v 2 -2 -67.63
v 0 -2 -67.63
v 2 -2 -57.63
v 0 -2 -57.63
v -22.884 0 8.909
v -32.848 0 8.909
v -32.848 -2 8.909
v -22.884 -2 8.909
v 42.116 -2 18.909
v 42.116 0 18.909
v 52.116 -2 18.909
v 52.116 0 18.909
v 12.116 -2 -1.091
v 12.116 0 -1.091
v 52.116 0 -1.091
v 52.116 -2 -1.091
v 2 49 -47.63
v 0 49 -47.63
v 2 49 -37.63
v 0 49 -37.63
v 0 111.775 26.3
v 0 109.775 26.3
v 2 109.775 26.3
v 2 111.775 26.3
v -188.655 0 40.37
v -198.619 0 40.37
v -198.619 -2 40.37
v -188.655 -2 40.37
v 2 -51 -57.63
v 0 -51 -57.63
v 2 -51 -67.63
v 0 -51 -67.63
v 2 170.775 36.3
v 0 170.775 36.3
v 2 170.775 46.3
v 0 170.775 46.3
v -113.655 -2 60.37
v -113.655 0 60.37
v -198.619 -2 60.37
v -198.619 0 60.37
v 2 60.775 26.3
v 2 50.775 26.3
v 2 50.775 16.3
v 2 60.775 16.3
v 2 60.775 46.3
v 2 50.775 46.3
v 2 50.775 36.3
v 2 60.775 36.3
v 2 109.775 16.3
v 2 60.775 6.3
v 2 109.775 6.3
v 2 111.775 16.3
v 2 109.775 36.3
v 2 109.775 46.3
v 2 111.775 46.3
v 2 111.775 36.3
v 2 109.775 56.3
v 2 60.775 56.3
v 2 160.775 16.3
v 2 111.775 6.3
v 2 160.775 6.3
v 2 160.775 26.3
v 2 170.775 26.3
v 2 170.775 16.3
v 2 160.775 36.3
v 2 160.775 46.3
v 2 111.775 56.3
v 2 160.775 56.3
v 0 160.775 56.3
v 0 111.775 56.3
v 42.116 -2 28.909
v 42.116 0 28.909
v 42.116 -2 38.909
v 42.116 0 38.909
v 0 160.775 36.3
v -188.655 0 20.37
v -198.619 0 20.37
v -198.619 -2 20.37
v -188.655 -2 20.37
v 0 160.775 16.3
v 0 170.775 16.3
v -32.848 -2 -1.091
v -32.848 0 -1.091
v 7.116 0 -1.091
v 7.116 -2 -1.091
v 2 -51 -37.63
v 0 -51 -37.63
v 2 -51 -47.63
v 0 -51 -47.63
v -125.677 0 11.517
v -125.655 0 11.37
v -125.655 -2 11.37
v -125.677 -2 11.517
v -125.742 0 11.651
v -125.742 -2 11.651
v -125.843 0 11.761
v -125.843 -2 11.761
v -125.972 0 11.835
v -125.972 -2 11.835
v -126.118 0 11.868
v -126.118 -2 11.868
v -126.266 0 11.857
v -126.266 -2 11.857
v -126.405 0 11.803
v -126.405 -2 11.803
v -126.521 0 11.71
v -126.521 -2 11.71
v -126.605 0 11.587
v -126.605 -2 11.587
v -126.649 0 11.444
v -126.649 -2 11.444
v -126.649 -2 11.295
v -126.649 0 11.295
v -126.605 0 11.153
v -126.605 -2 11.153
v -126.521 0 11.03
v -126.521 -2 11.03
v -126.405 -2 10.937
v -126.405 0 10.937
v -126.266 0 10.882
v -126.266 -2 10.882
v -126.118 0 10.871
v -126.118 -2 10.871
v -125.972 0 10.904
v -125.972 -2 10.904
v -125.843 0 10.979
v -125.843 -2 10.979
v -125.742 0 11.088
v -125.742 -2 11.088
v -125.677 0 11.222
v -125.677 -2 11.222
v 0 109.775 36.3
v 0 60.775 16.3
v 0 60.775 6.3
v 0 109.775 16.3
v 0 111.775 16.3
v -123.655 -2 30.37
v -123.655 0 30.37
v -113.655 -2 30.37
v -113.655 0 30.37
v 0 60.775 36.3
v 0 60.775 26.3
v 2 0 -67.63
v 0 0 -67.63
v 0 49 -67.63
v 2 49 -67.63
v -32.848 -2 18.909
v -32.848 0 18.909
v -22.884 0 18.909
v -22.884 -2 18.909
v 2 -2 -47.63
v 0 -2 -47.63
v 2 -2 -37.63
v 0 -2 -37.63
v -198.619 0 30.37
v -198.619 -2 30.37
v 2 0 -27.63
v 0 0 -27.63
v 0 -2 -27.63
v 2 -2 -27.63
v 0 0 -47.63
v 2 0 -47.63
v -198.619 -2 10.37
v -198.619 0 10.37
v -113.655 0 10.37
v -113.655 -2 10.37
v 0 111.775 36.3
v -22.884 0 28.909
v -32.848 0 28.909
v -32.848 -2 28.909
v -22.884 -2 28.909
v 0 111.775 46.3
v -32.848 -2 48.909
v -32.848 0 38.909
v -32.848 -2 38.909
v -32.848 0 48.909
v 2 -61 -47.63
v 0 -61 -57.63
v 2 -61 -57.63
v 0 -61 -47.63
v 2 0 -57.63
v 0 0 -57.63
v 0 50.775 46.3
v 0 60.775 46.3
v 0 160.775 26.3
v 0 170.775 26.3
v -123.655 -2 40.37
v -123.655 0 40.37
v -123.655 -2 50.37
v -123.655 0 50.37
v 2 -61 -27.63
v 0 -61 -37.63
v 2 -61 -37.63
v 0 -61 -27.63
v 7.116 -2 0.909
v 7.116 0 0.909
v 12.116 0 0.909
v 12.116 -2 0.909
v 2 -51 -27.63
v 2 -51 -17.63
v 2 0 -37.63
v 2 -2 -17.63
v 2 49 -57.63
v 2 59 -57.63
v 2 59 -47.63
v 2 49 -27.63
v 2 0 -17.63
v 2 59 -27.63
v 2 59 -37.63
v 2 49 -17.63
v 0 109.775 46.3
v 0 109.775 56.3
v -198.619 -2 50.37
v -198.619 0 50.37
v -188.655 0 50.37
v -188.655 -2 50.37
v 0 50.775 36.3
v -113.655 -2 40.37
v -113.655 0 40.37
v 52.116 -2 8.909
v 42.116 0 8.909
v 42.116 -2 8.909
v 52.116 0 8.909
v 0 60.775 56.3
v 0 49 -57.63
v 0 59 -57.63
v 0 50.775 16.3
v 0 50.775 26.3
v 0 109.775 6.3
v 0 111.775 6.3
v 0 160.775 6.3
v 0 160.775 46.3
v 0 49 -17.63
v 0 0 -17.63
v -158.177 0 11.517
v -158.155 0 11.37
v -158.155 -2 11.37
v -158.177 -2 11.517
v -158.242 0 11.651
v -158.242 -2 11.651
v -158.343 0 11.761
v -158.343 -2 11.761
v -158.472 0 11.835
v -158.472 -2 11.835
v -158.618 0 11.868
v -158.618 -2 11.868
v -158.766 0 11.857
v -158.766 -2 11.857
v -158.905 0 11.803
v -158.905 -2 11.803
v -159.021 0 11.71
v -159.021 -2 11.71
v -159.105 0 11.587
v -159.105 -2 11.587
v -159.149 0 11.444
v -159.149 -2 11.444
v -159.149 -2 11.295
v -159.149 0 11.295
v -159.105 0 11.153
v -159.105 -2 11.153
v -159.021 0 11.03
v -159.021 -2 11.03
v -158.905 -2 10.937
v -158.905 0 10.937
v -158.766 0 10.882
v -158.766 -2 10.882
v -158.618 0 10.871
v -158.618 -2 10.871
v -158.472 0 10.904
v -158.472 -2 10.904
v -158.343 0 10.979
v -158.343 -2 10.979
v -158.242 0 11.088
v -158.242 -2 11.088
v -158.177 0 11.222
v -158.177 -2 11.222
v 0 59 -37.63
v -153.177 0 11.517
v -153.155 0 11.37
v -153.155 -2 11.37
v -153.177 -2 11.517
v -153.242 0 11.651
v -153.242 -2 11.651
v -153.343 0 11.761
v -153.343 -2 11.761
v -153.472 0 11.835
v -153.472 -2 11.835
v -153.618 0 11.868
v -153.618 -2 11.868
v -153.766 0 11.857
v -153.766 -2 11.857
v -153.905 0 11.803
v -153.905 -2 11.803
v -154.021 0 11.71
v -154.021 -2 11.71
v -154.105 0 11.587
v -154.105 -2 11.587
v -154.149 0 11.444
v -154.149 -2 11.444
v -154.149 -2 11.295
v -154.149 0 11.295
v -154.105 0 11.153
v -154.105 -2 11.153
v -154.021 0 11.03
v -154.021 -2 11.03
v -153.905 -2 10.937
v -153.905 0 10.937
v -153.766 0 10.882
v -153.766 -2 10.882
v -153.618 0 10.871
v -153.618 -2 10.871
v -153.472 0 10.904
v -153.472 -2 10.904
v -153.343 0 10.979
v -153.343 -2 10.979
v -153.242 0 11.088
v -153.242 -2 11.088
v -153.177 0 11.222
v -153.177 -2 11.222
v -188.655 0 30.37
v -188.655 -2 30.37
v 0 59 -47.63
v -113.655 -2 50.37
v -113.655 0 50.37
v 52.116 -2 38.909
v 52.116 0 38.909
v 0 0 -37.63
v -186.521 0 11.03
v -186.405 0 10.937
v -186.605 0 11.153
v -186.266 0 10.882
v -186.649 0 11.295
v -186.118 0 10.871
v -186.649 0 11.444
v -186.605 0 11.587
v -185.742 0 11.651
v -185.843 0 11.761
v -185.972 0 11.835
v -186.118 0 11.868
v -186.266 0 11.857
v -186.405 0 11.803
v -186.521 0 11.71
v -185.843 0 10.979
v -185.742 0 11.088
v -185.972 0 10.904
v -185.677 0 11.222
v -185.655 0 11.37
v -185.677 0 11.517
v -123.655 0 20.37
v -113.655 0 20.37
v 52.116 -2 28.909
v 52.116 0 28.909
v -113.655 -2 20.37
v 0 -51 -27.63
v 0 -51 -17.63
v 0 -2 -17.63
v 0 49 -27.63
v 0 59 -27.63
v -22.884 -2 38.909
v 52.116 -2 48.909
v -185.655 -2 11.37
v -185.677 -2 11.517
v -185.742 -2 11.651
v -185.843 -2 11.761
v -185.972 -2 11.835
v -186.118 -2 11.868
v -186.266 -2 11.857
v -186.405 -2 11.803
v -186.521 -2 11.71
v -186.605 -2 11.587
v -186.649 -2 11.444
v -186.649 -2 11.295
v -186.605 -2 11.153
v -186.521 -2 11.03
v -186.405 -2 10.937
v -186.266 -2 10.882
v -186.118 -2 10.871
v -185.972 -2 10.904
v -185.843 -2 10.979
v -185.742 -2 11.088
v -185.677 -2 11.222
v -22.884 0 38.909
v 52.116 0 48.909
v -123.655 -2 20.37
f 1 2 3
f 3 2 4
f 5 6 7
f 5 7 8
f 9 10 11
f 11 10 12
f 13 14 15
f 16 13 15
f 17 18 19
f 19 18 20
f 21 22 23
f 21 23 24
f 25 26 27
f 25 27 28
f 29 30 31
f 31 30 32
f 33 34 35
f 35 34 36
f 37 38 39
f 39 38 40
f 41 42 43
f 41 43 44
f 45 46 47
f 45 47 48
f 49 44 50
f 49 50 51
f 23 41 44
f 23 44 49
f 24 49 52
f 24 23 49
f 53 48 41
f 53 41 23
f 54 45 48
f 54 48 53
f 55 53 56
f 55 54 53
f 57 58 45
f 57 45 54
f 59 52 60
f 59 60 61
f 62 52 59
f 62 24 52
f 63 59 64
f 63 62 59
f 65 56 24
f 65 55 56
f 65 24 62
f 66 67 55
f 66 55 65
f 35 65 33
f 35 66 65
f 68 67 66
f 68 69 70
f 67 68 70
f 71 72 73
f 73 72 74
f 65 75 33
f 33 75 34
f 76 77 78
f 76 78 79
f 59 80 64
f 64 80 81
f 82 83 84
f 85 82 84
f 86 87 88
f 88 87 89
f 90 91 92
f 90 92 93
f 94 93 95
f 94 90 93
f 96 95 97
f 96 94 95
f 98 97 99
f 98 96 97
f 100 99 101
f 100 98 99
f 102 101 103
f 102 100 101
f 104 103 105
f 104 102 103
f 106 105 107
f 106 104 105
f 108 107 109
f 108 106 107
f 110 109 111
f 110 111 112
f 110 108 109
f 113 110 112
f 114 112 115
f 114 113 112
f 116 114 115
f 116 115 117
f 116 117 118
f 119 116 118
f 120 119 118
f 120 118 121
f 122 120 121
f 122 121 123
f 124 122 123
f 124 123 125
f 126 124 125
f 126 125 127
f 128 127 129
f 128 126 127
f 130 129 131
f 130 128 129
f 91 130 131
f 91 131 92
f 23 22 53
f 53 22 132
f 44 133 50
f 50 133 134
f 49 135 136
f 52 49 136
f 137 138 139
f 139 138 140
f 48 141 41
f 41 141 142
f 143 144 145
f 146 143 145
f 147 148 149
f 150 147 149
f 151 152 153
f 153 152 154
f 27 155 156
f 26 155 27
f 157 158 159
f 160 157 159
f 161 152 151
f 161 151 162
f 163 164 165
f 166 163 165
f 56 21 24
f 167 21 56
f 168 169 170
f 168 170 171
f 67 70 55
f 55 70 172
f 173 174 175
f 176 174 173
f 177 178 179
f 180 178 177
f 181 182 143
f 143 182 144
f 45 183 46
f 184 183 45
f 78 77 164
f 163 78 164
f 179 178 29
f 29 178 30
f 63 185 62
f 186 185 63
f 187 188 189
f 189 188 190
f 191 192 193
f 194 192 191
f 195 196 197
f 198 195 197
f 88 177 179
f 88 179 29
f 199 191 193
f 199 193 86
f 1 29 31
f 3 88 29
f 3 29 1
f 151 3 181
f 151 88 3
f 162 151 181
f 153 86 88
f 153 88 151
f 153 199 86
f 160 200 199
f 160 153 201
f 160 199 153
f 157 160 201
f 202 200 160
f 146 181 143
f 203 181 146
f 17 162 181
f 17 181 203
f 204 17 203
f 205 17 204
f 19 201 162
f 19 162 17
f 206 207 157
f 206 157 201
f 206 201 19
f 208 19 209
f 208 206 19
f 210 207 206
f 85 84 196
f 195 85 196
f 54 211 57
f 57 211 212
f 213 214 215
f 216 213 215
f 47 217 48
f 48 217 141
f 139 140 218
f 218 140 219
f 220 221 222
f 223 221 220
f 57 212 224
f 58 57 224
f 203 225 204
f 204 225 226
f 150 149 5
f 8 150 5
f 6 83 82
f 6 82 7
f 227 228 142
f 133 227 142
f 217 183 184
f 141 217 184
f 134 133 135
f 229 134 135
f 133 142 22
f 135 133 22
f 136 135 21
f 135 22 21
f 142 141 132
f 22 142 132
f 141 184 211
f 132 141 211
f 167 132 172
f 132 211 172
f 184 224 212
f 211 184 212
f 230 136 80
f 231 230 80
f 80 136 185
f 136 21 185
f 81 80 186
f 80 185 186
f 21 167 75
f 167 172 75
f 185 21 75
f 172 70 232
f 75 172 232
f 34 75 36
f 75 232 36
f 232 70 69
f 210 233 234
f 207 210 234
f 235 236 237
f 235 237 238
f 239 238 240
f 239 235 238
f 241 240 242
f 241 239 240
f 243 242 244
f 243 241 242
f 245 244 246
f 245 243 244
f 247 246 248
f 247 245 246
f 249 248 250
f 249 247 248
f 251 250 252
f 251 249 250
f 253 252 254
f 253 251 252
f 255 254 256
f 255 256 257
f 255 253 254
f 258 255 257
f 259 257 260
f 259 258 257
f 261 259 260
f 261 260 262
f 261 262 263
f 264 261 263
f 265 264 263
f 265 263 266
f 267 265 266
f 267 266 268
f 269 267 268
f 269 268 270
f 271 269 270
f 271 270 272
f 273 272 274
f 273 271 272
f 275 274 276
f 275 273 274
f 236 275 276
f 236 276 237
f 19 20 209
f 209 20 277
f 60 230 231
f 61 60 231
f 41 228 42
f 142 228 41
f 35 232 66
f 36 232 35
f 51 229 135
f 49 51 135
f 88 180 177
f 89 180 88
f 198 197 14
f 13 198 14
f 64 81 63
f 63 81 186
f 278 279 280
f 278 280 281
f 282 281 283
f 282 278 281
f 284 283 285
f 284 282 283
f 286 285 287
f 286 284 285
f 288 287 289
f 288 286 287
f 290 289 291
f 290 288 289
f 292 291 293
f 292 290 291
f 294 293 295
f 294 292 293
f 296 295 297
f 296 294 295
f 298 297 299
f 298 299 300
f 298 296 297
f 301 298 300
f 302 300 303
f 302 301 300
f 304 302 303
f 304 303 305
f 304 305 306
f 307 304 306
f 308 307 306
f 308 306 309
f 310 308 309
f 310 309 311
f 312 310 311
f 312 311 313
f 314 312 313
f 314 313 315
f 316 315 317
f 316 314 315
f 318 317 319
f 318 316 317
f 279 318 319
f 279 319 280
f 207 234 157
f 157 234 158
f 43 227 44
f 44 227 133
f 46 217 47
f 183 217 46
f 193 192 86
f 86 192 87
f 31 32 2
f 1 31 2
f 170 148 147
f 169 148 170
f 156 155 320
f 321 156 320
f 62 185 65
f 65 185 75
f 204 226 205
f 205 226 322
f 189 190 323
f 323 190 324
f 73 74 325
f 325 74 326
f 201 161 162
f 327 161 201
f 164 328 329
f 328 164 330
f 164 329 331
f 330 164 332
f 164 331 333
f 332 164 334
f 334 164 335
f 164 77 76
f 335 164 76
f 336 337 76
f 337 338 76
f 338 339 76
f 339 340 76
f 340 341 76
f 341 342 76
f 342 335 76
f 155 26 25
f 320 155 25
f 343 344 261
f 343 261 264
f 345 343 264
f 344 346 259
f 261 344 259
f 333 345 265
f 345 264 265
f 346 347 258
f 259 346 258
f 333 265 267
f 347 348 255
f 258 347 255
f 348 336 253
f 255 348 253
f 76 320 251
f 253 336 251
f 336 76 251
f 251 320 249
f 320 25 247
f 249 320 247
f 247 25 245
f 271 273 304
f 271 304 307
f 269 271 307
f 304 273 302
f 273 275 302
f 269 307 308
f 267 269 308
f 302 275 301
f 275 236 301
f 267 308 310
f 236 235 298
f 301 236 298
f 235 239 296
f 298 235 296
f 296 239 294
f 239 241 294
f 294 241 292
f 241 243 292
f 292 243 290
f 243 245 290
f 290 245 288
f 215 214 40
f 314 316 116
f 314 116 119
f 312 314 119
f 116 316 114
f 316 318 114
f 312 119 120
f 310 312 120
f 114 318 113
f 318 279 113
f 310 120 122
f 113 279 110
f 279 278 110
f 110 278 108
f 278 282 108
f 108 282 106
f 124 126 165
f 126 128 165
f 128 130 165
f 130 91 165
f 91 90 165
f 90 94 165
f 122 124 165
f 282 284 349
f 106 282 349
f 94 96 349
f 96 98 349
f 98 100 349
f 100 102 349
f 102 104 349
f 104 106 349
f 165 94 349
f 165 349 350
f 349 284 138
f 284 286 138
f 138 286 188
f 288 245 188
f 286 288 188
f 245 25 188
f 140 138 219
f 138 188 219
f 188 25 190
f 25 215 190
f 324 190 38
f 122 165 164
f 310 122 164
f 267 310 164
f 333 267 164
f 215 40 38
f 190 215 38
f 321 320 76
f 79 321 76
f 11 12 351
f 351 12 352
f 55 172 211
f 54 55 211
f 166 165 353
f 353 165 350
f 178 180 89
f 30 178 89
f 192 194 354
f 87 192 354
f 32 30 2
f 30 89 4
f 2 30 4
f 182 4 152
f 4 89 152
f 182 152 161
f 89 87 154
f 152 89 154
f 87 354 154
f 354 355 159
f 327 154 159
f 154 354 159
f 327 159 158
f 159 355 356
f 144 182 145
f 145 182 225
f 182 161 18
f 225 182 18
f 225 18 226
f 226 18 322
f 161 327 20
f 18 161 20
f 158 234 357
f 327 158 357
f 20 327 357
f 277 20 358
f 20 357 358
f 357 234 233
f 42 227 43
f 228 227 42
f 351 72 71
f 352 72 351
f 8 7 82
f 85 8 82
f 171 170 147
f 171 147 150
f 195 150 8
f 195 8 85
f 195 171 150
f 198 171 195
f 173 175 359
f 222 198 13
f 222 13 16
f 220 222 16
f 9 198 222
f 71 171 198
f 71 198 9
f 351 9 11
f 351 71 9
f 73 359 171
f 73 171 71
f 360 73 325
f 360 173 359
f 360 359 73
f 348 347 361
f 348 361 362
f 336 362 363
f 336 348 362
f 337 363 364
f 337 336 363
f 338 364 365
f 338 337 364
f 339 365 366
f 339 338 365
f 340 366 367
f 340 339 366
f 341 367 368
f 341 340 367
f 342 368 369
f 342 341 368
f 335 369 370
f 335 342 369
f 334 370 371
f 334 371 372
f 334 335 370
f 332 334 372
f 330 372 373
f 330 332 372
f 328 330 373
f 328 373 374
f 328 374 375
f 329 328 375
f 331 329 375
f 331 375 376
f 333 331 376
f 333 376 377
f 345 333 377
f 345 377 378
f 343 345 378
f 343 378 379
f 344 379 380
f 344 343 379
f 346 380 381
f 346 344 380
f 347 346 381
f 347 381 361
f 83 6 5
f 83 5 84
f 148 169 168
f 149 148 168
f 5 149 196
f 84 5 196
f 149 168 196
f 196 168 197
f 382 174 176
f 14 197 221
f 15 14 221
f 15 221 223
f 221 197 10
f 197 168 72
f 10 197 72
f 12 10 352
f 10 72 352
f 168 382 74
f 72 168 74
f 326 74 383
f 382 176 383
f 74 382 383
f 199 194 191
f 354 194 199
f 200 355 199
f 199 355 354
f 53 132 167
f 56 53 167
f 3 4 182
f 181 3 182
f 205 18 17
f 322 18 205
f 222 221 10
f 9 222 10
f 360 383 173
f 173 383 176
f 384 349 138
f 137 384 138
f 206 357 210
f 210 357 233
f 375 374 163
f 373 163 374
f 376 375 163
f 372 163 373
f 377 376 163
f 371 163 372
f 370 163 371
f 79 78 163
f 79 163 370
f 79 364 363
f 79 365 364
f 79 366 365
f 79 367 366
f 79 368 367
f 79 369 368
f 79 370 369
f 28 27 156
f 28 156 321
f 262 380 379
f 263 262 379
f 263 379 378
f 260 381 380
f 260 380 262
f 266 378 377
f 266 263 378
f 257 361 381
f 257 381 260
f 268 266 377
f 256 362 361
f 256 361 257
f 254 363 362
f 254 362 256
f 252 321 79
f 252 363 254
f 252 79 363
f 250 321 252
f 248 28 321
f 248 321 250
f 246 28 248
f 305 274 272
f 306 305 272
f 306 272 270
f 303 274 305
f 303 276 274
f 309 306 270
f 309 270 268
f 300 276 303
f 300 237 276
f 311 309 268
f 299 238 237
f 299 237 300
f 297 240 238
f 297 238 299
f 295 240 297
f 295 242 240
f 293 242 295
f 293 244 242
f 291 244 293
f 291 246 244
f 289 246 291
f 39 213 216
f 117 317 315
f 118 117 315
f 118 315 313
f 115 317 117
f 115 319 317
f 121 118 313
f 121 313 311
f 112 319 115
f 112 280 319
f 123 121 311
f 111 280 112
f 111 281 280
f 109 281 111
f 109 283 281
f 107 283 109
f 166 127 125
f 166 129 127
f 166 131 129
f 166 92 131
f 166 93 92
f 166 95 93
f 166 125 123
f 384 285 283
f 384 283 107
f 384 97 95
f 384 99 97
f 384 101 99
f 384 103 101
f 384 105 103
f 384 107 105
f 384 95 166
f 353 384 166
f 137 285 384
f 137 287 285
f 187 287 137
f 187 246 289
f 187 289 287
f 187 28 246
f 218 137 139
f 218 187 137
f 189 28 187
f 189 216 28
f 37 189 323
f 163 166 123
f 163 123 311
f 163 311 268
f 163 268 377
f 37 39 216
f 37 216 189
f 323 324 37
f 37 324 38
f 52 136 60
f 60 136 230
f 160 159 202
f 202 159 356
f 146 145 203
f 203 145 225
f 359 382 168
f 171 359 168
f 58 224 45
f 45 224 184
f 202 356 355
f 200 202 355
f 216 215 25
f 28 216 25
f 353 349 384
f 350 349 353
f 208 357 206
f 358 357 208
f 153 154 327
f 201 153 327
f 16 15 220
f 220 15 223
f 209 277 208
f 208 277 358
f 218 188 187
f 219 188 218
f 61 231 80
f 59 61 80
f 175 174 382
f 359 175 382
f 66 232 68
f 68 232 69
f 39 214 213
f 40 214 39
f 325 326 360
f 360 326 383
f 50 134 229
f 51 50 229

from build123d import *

# Parameters (mm, degrees)
F0_W     = 9.963726
F0_H     = 10
F0_W_2   = 10
F0_R     = 0.5
F0_W_3   = 5
F0_H_2   = 2
F1_DEPTH = 2
F2_R     = 0.5
F2_W     = 10
F2_H     = 10
F2_W_2   = 9.963725
F3_DEPTH = 2
F4_W     = 10
F4_H     = 10
F4_W_2   = 2
F5_DEPTH = 2
F6_W     = 10
F6_H     = 10
F6_W_2   = 2
F7_DEPTH = 2


with BuildPart() as f1:
    # F0 (on Front) → F1 (new body)
    with BuildSketch(Plane.XZ):
        with Locations((-193.636792, 55.369643)):
            Rectangle(F0_W, F0_H)
        with Locations((-193.636792, 35.369705)):
            Rectangle(F0_W, F0_H)
        with Locations((-193.636792, 15.369766)):
            Rectangle(F0_W, F0_H)
        with Locations((-118.654929, 55.369643)):
            Rectangle(F0_W_2, F0_H)
        with Locations((-118.654929, 35.369643)):
            Rectangle(F0_W_2, F0_H)
        with Locations((-118.654929, 15.369643)):
            Rectangle(F0_W_2, F0_H)
        Polygon((-158.654929, 60.369643), (-188.654929, 60.369643), (-188.654929, 50.369643), (-188.654929, 40.369705), (-188.654929, 30.369705), (-188.654929, 20.369766), (-188.654929, 10.369766), (-198.618655, 10.369766), (-198.618655, 10.369643), (-123.654929, 10.369643), (-123.654929, 20.369643), (-123.654929, 30.369643), (-123.654929, 40.369643), (-123.654929, 50.369643), (-123.654929, 60.369643), (-153.654929, 60.369643), (-153.654929, 58.369643), (-158.654929, 58.369643), align=None)
        with Locations((-186.154929, 11.369643)):
            Circle(F0_R, mode=Mode.SUBTRACT)
        with Locations((-158.654929, 11.369643)):
            Circle(F0_R, mode=Mode.SUBTRACT)
        with Locations((-153.654929, 11.369643)):
            Circle(F0_R, mode=Mode.SUBTRACT)
        with Locations((-126.154929, 11.369643)):
            Circle(F0_R, mode=Mode.SUBTRACT)
        with Locations((-156.154929, 59.369643)):
            Rectangle(F0_W_3, F0_H_2)
    extrude(amount=F1_DEPTH)


with BuildPart() as f3:
    # F2 (on Front) → F3 (new body)
    with BuildSketch(Plane.XZ):
        Polygon((7.115502, 48.908719), (-22.884498, 48.908719), (-22.884498, 38.908719), (-22.884498, 28.908781), (-22.884498, 18.908781), (-22.884498, 8.908843), (-22.884498, -1.091157), (-32.848223, -1.091157), (-32.848223, -1.091281), (7.115502, -1.091281), (7.115502, 0.908719), (12.115502, 0.908719), (12.115502, -1.091281), (42.115502, -1.091281), (42.115502, 8.908719), (42.115502, 18.908719), (42.115502, 28.908719), (42.115502, 38.908719), (42.115502, 48.908719), (12.115502, 48.908719), align=None)
        with Locations((-20.384498, 3.908719)):
            Circle(F2_R, mode=Mode.SUBTRACT)
        with Locations((7.115502, 3.908719)):
            Circle(F2_R, mode=Mode.SUBTRACT)
        with Locations((12.115502, 3.908719)):
            Circle(F2_R, mode=Mode.SUBTRACT)
        with Locations((39.615502, 3.908719)):
            Circle(F2_R, mode=Mode.SUBTRACT)
        with Locations((47.115502, 43.908719)):
            Rectangle(F2_W, F2_H)
        with Locations((47.115502, 23.908719)):
            Rectangle(F2_W, F2_H)
        with Locations((47.115502, 3.908719)):
            Rectangle(F2_W, F2_H)
        with Locations((-27.86636, 43.908719)):
            Rectangle(F2_W_2, F2_H)
        with Locations((-27.86636, 23.908781)):
            Rectangle(F2_W_2, F2_H)
        with Locations((-27.86636, 3.908843)):
            Rectangle(F2_W_2, F2_H)
        with Locations((-20.384498, 3.908719)):
            Circle(F2_R)
        with Locations((7.115502, 3.908719)):
            Circle(F2_R)
        with Locations((12.115502, 3.908719)):
            Circle(F2_R)
        with Locations((39.615502, 3.908719)):
            Circle(F2_R)
    extrude(amount=F3_DEPTH)


with BuildPart() as f5:
    # F4 (on Right) → F5 (new body)
    with BuildSketch(Plane.YZ):
        with Locations((-56, -32.62999)):
            Rectangle(F4_W, F4_H)
        with Locations((-56, -52.62999)):
            Rectangle(F4_W, F4_H)
        with Locations((54, -32.62999)):
            Rectangle(F4_W, F4_H)
        with Locations((54, -52.62999)):
            Rectangle(F4_W, F4_H)
        Polygon((-2, -17.62999), (-51, -17.62999), (-51, -27.62999), (-51, -37.62999), (-51, -47.62999), (-51, -57.62999), (-51, -67.62999), (-2, -67.62999), (-2, -57.62999), (0, -57.62999), (0, -67.62999), (49, -67.62999), (49, -57.62999), (49, -47.62999), (49, -37.62999), (49, -27.62999), (49, -17.62999), (0, -17.62999), (0, -27.62999), (-2, -27.62999), align=None)
        with Locations((-1, -42.62999)):
            Rectangle(F4_W_2, F4_H, mode=Mode.SUBTRACT)
    extrude(amount=F5_DEPTH)


with BuildPart() as f7:
    # F6 (on Right) → F7 (new body)
    with BuildSketch(Plane.YZ):
        with Locations((55.775179, 41.300289)):
            Rectangle(F6_W, F6_H)
        with Locations((55.775179, 21.300289)):
            Rectangle(F6_W, F6_H)
        with Locations((165.775179, 41.300289)):
            Rectangle(F6_W, F6_H)
        with Locations((165.775179, 21.300289)):
            Rectangle(F6_W, F6_H)
        Polygon((109.775179, 56.300289), (60.775179, 56.300289), (60.775179, 46.300289), (60.775179, 36.300289), (60.775179, 26.300289), (60.775179, 16.300289), (60.775179, 6.300289), (109.775179, 6.300289), (109.775179, 16.300289), (111.775179, 16.300289), (111.775179, 6.300289), (160.775179, 6.300289), (160.775179, 16.300289), (160.775179, 26.300289), (160.775179, 36.300289), (160.775179, 46.300289), (160.775179, 56.300289), (111.775179, 56.300289), (111.775179, 46.300289), (109.775179, 46.300289), align=None)
        with Locations((110.775179, 31.300289)):
            Rectangle(F6_W_2, F6_H, mode=Mode.SUBTRACT)
    extrude(amount=F7_DEPTH)


solid = Compound([f1.part, f3.part, f5.part, f7.part])
